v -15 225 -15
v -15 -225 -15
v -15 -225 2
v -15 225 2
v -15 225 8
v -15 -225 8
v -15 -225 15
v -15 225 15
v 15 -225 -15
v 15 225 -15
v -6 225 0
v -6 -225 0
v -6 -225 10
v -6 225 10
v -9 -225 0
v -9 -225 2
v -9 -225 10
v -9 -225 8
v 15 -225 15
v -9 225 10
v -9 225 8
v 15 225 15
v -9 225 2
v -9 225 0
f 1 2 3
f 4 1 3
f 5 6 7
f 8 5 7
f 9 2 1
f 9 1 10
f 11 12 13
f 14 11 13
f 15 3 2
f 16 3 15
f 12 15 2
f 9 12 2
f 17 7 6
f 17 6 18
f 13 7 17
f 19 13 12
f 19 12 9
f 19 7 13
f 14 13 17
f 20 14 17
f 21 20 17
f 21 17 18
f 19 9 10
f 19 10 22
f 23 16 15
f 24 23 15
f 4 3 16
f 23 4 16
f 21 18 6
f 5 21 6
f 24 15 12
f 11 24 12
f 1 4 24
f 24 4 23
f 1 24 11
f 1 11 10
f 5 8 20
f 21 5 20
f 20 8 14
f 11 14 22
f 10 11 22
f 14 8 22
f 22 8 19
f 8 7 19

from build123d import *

# Parameters (mm, degrees)
F0_W          = 30
F0_H          = 30
F1_DEPTH      = 225
F1_DEPTH_BACK = 225
F3_DEPTH      = 450.001


with BuildPart() as f1:
    # F0 (on Front) → F1 (new body, two sides)
    with BuildSketch(Plane.XZ) as f1_sk:
        Rectangle(F0_W, F0_H)
    extrude(amount=F1_DEPTH)
    extrude(f1_sk.sketch, amount=-F1_DEPTH_BACK)

    # F2 (on face) → F3 (cut, through all)
    with BuildSketch(Plane.XZ.offset(225)):
        Polygon((-9, 8), (-15, 8), (-15, 2), (-9, 2), (-9, 0), (-6, 0), (-6, 10), (-9, 10), align=None)
    extrude(amount=-F3_DEPTH, mode=Mode.SUBTRACT)


solid = f1.part
